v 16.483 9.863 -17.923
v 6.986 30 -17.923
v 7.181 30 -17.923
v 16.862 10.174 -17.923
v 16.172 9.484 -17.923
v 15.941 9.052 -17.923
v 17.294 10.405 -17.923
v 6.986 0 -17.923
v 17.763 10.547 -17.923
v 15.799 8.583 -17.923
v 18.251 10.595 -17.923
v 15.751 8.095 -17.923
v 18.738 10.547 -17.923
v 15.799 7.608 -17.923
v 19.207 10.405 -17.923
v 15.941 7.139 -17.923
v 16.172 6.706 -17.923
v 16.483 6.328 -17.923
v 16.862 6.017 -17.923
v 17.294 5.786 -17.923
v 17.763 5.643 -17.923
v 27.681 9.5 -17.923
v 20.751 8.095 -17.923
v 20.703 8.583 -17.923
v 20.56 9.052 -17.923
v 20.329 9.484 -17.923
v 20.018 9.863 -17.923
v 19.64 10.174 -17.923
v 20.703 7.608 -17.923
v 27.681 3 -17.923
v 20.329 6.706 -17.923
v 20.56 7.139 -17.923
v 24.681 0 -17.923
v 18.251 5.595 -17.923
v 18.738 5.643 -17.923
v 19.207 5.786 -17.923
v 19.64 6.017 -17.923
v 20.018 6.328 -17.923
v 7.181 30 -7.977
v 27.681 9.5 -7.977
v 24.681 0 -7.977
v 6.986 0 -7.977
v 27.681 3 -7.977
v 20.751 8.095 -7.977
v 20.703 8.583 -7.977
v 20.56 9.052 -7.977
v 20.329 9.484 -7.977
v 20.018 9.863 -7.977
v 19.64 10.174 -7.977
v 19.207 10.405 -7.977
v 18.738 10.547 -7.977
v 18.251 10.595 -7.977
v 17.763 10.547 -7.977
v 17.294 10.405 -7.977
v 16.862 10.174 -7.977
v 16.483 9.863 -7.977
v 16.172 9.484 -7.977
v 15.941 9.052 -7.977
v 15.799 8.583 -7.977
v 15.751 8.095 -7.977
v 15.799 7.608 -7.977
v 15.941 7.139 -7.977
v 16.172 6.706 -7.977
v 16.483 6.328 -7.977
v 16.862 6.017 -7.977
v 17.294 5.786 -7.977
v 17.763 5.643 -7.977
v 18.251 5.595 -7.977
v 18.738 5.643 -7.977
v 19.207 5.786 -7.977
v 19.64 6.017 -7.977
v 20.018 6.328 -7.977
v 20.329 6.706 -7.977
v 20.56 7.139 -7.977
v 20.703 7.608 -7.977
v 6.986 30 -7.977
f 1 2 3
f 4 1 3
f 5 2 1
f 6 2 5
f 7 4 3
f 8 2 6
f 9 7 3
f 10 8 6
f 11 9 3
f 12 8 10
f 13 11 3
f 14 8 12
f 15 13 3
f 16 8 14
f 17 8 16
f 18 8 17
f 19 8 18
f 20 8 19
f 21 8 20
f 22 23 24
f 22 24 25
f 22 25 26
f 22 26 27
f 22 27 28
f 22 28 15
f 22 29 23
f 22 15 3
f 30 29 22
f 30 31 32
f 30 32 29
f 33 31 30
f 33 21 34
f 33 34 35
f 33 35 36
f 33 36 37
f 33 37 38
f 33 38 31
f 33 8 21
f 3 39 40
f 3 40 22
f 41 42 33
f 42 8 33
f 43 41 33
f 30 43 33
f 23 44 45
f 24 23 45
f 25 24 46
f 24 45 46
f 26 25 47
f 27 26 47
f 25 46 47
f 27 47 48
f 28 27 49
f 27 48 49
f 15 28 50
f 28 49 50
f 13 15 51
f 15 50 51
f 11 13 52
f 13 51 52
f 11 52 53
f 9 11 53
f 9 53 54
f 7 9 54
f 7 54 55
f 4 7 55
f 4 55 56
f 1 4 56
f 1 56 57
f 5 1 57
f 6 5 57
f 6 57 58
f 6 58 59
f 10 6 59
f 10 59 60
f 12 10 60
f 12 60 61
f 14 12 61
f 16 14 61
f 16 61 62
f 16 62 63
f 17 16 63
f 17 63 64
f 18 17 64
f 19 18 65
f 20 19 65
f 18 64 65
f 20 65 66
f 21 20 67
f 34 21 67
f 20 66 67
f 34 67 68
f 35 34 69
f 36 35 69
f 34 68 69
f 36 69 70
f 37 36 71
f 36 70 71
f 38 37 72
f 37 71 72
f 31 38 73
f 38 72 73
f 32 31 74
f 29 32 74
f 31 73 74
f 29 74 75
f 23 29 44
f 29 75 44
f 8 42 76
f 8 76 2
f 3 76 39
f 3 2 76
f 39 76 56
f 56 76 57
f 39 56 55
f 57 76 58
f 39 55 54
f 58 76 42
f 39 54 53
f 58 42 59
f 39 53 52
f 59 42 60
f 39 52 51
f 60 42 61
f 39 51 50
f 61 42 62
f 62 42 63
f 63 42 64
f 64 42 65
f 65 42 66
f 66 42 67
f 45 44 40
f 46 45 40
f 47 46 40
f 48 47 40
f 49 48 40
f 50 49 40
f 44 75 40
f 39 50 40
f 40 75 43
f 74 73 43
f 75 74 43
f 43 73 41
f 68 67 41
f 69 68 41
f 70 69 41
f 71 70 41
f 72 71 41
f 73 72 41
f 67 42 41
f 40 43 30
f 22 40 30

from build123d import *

# Parameters (mm, degrees)
SKETCH_4_W          = 20.69495493
SKETCH_4_H          = 9.945675455
EXTRUDE_4_DEPTH     = 30
CHAMFER_1_SIZE      = 20.5
CHAMFER_2_SIZE      = 3
SKETCH_5_R          = 2.499998555
CUT_EXTRUDE_1_DEPTH = 43.013443482


with BuildPart() as part:
    # Эскиз4 → Вытянуть4 (new body)
    with BuildSketch(Plane(origin=(0, 0, 0), x_dir=(1, 0, 0), z_dir=(0, 1, 0))):
        with Locations((17.333074787, 12.950285074)):
            Rectangle(SKETCH_4_W, SKETCH_4_H)
    extrude(amount=EXTRUDE_4_DEPTH)

    # Фаска1
    chamfer_1_edges = [part.edges().sort_by_distance(p)[0] for p in [
        (27.680552252, 30, -12.950285073),
    ]]
    chamfer(chamfer_1_edges, length=CHAMFER_1_SIZE)

    # Фаска2
    chamfer_2_edges = [part.edges().sort_by_distance(p)[0] for p in [
        (27.680552252, 0, -12.950285073),
    ]]
    chamfer(chamfer_2_edges, length=CHAMFER_2_SIZE)

    # Эскиз5 → Вырез-Вытянуть1 (cut, through all)
    with BuildSketch(Plane.XY.offset(-7.977447346)):
        with Locations((18.250594968, 8.095401179)):
            Circle(SKETCH_5_R)
    extrude(amount=-CUT_EXTRUDE_1_DEPTH, mode=Mode.SUBTRACT)


solid = part.part
